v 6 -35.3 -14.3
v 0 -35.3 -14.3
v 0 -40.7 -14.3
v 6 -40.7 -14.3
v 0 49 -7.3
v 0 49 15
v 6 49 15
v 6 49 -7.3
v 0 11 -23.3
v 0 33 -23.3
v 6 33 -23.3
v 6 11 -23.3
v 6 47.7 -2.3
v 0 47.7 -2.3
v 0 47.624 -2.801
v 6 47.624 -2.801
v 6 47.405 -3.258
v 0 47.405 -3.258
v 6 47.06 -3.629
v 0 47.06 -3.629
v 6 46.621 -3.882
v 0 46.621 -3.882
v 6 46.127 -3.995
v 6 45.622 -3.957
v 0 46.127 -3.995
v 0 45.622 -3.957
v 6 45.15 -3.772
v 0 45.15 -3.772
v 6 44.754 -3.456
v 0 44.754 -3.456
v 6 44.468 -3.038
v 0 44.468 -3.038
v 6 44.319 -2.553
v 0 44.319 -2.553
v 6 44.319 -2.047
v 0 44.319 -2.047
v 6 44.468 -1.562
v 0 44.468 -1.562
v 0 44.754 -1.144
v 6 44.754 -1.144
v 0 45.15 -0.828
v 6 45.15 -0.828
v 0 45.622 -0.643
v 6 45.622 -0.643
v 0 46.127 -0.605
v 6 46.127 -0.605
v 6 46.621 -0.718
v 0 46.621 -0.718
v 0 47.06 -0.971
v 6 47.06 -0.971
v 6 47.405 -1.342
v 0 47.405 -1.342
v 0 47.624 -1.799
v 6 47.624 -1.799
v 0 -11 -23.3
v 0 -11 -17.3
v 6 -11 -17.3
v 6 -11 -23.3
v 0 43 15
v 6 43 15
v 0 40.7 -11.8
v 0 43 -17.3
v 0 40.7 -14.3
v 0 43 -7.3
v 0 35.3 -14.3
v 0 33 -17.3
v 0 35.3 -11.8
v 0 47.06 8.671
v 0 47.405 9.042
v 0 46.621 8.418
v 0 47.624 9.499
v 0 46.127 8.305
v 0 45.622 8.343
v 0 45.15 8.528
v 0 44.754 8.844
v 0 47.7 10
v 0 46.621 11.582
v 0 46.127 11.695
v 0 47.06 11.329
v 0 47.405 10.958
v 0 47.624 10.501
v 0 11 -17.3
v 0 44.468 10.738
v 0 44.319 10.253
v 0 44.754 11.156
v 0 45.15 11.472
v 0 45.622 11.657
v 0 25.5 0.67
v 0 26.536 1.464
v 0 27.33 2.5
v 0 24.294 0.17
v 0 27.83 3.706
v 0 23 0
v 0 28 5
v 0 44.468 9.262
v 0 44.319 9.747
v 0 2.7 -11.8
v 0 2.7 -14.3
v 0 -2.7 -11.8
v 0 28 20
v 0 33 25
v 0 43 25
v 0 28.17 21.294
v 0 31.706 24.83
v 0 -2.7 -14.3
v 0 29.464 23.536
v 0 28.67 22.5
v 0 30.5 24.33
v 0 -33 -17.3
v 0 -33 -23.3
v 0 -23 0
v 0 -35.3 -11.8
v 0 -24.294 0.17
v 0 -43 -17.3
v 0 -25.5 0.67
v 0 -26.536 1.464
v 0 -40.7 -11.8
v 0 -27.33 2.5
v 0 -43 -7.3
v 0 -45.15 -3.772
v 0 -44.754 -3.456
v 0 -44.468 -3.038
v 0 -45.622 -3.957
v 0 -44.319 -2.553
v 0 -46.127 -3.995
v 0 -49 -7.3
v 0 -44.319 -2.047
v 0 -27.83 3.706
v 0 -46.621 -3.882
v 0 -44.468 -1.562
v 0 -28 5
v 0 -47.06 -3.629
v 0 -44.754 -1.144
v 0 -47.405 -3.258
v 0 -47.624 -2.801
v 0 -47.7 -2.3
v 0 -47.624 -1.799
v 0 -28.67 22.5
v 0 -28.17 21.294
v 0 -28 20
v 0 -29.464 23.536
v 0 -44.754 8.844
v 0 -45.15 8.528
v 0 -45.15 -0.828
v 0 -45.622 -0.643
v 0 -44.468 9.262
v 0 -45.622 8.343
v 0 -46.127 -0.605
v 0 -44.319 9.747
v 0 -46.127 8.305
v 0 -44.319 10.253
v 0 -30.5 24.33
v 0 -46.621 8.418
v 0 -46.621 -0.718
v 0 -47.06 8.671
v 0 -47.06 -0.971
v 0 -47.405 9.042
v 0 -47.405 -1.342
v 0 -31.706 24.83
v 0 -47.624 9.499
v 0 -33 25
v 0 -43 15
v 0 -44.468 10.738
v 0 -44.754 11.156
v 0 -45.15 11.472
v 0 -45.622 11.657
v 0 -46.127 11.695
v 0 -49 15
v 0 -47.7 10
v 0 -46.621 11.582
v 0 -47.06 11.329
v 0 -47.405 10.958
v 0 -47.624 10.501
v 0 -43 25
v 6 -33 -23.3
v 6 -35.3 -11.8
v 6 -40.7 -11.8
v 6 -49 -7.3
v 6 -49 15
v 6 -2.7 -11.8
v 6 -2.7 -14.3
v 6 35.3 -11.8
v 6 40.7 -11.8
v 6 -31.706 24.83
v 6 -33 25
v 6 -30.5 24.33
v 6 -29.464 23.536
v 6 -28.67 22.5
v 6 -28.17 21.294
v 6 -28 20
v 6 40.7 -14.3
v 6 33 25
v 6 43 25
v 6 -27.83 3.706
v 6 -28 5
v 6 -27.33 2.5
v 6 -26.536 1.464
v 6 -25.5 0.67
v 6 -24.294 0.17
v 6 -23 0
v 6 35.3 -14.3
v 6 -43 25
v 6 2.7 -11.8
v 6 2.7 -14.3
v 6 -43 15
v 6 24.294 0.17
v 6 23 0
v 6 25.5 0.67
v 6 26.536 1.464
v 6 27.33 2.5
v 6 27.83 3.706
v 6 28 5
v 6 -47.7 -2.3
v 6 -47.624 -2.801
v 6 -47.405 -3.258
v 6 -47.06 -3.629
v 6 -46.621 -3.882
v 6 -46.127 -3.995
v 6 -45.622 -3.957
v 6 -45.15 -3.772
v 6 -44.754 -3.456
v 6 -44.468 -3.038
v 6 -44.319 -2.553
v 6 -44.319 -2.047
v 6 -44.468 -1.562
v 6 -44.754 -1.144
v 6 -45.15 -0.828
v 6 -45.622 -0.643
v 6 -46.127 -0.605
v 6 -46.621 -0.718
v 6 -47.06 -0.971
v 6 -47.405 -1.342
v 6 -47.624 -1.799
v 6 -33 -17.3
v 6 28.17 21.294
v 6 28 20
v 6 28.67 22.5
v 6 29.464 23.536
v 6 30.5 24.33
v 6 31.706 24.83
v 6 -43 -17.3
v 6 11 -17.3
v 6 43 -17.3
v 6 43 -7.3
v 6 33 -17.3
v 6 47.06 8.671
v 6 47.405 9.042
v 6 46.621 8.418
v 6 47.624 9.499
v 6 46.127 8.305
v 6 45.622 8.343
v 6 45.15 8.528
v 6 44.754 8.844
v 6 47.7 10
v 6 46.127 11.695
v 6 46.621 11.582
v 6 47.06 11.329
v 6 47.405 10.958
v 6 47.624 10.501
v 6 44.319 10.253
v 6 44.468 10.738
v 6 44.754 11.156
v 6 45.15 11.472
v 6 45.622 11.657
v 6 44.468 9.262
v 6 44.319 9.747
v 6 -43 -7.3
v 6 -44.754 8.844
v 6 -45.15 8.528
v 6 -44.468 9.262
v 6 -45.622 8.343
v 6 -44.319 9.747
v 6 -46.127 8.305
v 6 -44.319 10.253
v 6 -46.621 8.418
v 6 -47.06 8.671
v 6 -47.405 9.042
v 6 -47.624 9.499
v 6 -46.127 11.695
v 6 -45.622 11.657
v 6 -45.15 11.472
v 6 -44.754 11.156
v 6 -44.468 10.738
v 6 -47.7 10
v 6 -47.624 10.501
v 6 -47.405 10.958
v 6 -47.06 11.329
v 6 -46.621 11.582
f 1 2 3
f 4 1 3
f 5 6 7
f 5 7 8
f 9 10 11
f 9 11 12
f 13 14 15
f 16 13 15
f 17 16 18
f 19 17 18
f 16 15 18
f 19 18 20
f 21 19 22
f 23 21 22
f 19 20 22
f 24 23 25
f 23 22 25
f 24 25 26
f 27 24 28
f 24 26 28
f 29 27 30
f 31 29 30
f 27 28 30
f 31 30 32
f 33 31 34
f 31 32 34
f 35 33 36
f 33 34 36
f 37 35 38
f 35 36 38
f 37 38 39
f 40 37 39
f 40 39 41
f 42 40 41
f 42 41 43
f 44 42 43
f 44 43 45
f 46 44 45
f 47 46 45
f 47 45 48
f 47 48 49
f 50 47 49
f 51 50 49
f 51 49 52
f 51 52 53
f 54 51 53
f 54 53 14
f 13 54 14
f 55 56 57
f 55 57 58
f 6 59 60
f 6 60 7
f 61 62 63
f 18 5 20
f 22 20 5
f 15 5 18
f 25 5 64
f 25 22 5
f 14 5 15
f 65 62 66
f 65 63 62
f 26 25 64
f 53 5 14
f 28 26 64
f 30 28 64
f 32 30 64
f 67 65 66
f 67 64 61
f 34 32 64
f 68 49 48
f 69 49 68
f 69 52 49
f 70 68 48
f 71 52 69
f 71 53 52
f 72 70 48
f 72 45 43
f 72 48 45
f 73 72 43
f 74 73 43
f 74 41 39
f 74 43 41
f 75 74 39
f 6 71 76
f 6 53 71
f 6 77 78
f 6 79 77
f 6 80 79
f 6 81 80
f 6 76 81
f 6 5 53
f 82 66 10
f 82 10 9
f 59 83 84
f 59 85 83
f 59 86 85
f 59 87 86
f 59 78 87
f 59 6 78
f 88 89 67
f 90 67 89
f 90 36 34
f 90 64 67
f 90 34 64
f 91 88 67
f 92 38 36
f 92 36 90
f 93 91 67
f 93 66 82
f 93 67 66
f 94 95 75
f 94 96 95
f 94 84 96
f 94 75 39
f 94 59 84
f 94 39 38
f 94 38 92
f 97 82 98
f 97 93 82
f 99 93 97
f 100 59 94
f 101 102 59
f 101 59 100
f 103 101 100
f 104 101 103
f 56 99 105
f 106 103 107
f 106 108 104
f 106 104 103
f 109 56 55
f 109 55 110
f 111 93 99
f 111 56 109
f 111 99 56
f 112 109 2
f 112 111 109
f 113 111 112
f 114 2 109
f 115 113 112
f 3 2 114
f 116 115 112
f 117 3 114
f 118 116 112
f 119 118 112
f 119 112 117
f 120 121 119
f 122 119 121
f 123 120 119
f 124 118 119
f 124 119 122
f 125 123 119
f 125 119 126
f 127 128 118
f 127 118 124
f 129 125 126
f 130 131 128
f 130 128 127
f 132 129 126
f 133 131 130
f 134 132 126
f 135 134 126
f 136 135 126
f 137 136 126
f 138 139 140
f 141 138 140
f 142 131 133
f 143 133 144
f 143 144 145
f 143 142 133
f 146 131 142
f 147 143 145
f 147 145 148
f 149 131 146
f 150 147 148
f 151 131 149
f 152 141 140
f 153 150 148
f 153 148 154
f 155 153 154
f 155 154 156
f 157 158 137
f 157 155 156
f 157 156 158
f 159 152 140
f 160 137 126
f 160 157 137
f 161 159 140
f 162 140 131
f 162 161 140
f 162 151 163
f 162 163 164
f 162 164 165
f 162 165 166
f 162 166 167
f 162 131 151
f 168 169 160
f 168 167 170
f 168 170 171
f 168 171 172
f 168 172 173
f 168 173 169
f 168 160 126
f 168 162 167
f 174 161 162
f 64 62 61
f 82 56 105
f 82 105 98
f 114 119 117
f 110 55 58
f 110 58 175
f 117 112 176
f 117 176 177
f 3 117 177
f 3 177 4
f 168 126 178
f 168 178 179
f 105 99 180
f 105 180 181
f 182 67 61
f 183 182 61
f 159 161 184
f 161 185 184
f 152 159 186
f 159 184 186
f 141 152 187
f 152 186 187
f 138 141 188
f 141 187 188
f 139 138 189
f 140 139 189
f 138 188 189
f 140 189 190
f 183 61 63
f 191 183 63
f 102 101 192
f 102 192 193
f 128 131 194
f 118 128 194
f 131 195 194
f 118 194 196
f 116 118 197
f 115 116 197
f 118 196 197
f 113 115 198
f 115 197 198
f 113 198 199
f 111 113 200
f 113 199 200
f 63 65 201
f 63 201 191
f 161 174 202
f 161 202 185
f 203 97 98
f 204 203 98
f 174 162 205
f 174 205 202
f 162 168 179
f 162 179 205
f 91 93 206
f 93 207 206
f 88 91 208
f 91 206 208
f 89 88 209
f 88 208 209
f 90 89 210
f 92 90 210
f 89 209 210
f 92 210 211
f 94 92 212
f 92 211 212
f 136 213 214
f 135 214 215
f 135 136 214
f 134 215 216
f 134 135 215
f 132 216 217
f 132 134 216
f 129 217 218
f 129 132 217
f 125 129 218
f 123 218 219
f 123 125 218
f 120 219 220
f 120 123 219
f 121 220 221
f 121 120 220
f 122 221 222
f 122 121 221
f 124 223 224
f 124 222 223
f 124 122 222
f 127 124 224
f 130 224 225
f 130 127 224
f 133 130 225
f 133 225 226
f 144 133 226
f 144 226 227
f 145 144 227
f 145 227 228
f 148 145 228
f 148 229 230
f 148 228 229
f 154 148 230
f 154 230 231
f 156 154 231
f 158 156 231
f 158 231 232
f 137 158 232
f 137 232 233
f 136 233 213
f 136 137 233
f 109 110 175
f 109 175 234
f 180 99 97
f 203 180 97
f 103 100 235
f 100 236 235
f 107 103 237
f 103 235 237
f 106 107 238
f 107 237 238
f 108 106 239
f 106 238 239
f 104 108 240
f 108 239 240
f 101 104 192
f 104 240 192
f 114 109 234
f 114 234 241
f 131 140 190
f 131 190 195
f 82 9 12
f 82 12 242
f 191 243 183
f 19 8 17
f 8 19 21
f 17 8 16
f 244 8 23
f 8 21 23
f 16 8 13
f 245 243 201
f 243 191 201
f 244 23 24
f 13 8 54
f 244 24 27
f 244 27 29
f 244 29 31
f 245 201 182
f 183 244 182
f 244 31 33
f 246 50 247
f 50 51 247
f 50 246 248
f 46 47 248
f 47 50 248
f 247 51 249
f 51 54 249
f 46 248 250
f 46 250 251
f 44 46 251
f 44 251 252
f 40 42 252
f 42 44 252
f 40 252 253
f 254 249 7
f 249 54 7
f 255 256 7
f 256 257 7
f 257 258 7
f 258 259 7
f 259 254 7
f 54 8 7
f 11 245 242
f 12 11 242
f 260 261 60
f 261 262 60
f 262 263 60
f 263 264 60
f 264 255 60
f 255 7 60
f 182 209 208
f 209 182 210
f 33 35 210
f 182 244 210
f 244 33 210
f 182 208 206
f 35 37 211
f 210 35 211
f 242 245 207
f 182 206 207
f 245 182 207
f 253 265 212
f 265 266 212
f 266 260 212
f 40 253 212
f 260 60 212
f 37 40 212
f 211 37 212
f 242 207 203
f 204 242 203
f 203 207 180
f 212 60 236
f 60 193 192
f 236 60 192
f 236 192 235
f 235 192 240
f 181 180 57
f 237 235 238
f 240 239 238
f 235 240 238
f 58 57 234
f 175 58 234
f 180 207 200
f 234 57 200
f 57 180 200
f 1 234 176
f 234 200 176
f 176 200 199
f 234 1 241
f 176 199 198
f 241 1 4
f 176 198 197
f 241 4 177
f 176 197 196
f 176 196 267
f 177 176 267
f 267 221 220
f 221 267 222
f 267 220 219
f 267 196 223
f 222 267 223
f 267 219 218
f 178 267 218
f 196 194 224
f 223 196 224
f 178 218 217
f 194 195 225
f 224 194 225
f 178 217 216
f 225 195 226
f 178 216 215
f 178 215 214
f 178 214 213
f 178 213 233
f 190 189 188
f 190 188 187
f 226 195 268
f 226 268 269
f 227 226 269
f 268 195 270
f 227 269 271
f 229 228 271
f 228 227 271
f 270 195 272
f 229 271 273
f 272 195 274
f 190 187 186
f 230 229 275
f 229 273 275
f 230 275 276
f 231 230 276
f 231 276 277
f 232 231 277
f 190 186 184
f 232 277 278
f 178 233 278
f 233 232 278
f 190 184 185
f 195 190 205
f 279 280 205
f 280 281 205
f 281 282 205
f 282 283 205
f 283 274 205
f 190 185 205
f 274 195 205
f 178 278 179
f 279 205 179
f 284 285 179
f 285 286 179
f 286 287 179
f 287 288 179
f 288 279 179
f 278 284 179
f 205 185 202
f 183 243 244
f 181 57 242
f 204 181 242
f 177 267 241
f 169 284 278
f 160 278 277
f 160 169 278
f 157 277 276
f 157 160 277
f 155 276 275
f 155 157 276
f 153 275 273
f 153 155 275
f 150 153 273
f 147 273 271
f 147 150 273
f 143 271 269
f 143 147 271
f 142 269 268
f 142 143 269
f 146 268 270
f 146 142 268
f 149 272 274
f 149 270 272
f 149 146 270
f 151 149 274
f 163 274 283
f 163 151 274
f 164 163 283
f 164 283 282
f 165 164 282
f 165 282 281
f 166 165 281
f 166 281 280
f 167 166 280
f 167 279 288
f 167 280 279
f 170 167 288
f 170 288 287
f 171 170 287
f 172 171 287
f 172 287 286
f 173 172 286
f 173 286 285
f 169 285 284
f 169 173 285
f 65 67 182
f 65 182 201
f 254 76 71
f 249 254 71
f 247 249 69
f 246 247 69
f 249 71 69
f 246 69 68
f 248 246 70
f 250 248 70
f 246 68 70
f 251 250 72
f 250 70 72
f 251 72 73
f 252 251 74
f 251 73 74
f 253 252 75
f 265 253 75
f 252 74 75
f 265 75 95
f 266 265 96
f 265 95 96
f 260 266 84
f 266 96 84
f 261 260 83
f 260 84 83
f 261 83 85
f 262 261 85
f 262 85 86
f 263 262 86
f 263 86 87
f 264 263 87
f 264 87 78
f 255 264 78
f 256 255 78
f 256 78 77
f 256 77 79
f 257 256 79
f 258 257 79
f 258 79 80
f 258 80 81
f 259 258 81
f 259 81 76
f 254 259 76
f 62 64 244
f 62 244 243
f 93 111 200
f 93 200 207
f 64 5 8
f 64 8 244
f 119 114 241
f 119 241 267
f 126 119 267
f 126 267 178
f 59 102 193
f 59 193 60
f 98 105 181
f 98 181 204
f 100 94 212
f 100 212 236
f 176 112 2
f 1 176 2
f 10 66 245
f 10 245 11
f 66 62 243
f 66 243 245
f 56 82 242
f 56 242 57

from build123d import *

# Parameters (mm, degrees)
PAD_DEPTH       = 6
SKETCH001_W     = 5.4
SKETCH001_H     = 2.5
SKETCH001_W_2   = 2.7
POCKET_DEPTH    = 224.842404
SKETCH002_R     = 1.7
POCKET001_DEPTH = 224.842404
FILLET_R        = 5


with BuildPart() as part:
    # Sketch → Pad (new body)
    with BuildSketch(Plane.YZ):
        Polygon((-43, 25), (-28, 25), (-28, 0), (28, 0), (28, 25), (43, 25), (43, 15), (49, 15), (49, -7.3), (43, -7.3), (43, -17.3), (33, -17.3), (33, -23.3), (11, -23.3), (11, -17.3), (-11, -17.3), (-11, -23.3), (-33, -23.3), (-33, -17.3), (-43, -17.3), (-43, -7.3), (-49, -7.3), (-49, 15), (-43, 15), align=None)
    extrude(amount=PAD_DEPTH)

    # Sketch001 (on Face25 of Pad) → Pocket (cut, through all)
    with BuildSketch(Plane(origin=(0, 0, 0), x_dir=(0, 1, 0), z_dir=(-1, 0, 0))):
        with Locations((38, 13.05)):
            Rectangle(SKETCH001_W, SKETCH001_H)
        with Locations((1.35, 13.05)):
            Rectangle(SKETCH001_W_2, SKETCH001_H)
    pocket = extrude(amount=-POCKET_DEPTH, mode=Mode.SUBTRACT)

    # Mirrored: Pocket across Sketch001 V_Axis
    add(pocket.mirror(Plane(origin=(0, 0, 0), x_dir=(-1, 0, 0), z_dir=(0, 1, 0))), mode=Mode.SUBTRACT)

    # Sketch002 (on Face4 of Mirrored) → Pocket001 (cut, through all)
    with BuildSketch(Plane(origin=(0, 0, 0), x_dir=(0, 1, 0), z_dir=(-1, 0, 0))):
        with Locations((46, -10)):
            Circle(SKETCH002_R)
        with Locations((46, 2.3)):
            Circle(SKETCH002_R)
    pocket001 = extrude(amount=-POCKET001_DEPTH, mode=Mode.SUBTRACT)

    # Mirrored001: Pocket001 across Sketch002 V_Axis
    add(pocket001.mirror(Plane(origin=(0, 0, 0), x_dir=(-1, 0, 0), z_dir=(0, 1, 0))), mode=Mode.SUBTRACT)

    # Fillet
    fillet_edges = [part.edges().sort_by_distance(p)[0] for p in [
        (3, -28, 0),
        (3, -28, 25),
        (3, 28, 25),
        (3, 28, 0),
    ]]
    fillet(fillet_edges, radius=FILLET_R)


solid = part.part
